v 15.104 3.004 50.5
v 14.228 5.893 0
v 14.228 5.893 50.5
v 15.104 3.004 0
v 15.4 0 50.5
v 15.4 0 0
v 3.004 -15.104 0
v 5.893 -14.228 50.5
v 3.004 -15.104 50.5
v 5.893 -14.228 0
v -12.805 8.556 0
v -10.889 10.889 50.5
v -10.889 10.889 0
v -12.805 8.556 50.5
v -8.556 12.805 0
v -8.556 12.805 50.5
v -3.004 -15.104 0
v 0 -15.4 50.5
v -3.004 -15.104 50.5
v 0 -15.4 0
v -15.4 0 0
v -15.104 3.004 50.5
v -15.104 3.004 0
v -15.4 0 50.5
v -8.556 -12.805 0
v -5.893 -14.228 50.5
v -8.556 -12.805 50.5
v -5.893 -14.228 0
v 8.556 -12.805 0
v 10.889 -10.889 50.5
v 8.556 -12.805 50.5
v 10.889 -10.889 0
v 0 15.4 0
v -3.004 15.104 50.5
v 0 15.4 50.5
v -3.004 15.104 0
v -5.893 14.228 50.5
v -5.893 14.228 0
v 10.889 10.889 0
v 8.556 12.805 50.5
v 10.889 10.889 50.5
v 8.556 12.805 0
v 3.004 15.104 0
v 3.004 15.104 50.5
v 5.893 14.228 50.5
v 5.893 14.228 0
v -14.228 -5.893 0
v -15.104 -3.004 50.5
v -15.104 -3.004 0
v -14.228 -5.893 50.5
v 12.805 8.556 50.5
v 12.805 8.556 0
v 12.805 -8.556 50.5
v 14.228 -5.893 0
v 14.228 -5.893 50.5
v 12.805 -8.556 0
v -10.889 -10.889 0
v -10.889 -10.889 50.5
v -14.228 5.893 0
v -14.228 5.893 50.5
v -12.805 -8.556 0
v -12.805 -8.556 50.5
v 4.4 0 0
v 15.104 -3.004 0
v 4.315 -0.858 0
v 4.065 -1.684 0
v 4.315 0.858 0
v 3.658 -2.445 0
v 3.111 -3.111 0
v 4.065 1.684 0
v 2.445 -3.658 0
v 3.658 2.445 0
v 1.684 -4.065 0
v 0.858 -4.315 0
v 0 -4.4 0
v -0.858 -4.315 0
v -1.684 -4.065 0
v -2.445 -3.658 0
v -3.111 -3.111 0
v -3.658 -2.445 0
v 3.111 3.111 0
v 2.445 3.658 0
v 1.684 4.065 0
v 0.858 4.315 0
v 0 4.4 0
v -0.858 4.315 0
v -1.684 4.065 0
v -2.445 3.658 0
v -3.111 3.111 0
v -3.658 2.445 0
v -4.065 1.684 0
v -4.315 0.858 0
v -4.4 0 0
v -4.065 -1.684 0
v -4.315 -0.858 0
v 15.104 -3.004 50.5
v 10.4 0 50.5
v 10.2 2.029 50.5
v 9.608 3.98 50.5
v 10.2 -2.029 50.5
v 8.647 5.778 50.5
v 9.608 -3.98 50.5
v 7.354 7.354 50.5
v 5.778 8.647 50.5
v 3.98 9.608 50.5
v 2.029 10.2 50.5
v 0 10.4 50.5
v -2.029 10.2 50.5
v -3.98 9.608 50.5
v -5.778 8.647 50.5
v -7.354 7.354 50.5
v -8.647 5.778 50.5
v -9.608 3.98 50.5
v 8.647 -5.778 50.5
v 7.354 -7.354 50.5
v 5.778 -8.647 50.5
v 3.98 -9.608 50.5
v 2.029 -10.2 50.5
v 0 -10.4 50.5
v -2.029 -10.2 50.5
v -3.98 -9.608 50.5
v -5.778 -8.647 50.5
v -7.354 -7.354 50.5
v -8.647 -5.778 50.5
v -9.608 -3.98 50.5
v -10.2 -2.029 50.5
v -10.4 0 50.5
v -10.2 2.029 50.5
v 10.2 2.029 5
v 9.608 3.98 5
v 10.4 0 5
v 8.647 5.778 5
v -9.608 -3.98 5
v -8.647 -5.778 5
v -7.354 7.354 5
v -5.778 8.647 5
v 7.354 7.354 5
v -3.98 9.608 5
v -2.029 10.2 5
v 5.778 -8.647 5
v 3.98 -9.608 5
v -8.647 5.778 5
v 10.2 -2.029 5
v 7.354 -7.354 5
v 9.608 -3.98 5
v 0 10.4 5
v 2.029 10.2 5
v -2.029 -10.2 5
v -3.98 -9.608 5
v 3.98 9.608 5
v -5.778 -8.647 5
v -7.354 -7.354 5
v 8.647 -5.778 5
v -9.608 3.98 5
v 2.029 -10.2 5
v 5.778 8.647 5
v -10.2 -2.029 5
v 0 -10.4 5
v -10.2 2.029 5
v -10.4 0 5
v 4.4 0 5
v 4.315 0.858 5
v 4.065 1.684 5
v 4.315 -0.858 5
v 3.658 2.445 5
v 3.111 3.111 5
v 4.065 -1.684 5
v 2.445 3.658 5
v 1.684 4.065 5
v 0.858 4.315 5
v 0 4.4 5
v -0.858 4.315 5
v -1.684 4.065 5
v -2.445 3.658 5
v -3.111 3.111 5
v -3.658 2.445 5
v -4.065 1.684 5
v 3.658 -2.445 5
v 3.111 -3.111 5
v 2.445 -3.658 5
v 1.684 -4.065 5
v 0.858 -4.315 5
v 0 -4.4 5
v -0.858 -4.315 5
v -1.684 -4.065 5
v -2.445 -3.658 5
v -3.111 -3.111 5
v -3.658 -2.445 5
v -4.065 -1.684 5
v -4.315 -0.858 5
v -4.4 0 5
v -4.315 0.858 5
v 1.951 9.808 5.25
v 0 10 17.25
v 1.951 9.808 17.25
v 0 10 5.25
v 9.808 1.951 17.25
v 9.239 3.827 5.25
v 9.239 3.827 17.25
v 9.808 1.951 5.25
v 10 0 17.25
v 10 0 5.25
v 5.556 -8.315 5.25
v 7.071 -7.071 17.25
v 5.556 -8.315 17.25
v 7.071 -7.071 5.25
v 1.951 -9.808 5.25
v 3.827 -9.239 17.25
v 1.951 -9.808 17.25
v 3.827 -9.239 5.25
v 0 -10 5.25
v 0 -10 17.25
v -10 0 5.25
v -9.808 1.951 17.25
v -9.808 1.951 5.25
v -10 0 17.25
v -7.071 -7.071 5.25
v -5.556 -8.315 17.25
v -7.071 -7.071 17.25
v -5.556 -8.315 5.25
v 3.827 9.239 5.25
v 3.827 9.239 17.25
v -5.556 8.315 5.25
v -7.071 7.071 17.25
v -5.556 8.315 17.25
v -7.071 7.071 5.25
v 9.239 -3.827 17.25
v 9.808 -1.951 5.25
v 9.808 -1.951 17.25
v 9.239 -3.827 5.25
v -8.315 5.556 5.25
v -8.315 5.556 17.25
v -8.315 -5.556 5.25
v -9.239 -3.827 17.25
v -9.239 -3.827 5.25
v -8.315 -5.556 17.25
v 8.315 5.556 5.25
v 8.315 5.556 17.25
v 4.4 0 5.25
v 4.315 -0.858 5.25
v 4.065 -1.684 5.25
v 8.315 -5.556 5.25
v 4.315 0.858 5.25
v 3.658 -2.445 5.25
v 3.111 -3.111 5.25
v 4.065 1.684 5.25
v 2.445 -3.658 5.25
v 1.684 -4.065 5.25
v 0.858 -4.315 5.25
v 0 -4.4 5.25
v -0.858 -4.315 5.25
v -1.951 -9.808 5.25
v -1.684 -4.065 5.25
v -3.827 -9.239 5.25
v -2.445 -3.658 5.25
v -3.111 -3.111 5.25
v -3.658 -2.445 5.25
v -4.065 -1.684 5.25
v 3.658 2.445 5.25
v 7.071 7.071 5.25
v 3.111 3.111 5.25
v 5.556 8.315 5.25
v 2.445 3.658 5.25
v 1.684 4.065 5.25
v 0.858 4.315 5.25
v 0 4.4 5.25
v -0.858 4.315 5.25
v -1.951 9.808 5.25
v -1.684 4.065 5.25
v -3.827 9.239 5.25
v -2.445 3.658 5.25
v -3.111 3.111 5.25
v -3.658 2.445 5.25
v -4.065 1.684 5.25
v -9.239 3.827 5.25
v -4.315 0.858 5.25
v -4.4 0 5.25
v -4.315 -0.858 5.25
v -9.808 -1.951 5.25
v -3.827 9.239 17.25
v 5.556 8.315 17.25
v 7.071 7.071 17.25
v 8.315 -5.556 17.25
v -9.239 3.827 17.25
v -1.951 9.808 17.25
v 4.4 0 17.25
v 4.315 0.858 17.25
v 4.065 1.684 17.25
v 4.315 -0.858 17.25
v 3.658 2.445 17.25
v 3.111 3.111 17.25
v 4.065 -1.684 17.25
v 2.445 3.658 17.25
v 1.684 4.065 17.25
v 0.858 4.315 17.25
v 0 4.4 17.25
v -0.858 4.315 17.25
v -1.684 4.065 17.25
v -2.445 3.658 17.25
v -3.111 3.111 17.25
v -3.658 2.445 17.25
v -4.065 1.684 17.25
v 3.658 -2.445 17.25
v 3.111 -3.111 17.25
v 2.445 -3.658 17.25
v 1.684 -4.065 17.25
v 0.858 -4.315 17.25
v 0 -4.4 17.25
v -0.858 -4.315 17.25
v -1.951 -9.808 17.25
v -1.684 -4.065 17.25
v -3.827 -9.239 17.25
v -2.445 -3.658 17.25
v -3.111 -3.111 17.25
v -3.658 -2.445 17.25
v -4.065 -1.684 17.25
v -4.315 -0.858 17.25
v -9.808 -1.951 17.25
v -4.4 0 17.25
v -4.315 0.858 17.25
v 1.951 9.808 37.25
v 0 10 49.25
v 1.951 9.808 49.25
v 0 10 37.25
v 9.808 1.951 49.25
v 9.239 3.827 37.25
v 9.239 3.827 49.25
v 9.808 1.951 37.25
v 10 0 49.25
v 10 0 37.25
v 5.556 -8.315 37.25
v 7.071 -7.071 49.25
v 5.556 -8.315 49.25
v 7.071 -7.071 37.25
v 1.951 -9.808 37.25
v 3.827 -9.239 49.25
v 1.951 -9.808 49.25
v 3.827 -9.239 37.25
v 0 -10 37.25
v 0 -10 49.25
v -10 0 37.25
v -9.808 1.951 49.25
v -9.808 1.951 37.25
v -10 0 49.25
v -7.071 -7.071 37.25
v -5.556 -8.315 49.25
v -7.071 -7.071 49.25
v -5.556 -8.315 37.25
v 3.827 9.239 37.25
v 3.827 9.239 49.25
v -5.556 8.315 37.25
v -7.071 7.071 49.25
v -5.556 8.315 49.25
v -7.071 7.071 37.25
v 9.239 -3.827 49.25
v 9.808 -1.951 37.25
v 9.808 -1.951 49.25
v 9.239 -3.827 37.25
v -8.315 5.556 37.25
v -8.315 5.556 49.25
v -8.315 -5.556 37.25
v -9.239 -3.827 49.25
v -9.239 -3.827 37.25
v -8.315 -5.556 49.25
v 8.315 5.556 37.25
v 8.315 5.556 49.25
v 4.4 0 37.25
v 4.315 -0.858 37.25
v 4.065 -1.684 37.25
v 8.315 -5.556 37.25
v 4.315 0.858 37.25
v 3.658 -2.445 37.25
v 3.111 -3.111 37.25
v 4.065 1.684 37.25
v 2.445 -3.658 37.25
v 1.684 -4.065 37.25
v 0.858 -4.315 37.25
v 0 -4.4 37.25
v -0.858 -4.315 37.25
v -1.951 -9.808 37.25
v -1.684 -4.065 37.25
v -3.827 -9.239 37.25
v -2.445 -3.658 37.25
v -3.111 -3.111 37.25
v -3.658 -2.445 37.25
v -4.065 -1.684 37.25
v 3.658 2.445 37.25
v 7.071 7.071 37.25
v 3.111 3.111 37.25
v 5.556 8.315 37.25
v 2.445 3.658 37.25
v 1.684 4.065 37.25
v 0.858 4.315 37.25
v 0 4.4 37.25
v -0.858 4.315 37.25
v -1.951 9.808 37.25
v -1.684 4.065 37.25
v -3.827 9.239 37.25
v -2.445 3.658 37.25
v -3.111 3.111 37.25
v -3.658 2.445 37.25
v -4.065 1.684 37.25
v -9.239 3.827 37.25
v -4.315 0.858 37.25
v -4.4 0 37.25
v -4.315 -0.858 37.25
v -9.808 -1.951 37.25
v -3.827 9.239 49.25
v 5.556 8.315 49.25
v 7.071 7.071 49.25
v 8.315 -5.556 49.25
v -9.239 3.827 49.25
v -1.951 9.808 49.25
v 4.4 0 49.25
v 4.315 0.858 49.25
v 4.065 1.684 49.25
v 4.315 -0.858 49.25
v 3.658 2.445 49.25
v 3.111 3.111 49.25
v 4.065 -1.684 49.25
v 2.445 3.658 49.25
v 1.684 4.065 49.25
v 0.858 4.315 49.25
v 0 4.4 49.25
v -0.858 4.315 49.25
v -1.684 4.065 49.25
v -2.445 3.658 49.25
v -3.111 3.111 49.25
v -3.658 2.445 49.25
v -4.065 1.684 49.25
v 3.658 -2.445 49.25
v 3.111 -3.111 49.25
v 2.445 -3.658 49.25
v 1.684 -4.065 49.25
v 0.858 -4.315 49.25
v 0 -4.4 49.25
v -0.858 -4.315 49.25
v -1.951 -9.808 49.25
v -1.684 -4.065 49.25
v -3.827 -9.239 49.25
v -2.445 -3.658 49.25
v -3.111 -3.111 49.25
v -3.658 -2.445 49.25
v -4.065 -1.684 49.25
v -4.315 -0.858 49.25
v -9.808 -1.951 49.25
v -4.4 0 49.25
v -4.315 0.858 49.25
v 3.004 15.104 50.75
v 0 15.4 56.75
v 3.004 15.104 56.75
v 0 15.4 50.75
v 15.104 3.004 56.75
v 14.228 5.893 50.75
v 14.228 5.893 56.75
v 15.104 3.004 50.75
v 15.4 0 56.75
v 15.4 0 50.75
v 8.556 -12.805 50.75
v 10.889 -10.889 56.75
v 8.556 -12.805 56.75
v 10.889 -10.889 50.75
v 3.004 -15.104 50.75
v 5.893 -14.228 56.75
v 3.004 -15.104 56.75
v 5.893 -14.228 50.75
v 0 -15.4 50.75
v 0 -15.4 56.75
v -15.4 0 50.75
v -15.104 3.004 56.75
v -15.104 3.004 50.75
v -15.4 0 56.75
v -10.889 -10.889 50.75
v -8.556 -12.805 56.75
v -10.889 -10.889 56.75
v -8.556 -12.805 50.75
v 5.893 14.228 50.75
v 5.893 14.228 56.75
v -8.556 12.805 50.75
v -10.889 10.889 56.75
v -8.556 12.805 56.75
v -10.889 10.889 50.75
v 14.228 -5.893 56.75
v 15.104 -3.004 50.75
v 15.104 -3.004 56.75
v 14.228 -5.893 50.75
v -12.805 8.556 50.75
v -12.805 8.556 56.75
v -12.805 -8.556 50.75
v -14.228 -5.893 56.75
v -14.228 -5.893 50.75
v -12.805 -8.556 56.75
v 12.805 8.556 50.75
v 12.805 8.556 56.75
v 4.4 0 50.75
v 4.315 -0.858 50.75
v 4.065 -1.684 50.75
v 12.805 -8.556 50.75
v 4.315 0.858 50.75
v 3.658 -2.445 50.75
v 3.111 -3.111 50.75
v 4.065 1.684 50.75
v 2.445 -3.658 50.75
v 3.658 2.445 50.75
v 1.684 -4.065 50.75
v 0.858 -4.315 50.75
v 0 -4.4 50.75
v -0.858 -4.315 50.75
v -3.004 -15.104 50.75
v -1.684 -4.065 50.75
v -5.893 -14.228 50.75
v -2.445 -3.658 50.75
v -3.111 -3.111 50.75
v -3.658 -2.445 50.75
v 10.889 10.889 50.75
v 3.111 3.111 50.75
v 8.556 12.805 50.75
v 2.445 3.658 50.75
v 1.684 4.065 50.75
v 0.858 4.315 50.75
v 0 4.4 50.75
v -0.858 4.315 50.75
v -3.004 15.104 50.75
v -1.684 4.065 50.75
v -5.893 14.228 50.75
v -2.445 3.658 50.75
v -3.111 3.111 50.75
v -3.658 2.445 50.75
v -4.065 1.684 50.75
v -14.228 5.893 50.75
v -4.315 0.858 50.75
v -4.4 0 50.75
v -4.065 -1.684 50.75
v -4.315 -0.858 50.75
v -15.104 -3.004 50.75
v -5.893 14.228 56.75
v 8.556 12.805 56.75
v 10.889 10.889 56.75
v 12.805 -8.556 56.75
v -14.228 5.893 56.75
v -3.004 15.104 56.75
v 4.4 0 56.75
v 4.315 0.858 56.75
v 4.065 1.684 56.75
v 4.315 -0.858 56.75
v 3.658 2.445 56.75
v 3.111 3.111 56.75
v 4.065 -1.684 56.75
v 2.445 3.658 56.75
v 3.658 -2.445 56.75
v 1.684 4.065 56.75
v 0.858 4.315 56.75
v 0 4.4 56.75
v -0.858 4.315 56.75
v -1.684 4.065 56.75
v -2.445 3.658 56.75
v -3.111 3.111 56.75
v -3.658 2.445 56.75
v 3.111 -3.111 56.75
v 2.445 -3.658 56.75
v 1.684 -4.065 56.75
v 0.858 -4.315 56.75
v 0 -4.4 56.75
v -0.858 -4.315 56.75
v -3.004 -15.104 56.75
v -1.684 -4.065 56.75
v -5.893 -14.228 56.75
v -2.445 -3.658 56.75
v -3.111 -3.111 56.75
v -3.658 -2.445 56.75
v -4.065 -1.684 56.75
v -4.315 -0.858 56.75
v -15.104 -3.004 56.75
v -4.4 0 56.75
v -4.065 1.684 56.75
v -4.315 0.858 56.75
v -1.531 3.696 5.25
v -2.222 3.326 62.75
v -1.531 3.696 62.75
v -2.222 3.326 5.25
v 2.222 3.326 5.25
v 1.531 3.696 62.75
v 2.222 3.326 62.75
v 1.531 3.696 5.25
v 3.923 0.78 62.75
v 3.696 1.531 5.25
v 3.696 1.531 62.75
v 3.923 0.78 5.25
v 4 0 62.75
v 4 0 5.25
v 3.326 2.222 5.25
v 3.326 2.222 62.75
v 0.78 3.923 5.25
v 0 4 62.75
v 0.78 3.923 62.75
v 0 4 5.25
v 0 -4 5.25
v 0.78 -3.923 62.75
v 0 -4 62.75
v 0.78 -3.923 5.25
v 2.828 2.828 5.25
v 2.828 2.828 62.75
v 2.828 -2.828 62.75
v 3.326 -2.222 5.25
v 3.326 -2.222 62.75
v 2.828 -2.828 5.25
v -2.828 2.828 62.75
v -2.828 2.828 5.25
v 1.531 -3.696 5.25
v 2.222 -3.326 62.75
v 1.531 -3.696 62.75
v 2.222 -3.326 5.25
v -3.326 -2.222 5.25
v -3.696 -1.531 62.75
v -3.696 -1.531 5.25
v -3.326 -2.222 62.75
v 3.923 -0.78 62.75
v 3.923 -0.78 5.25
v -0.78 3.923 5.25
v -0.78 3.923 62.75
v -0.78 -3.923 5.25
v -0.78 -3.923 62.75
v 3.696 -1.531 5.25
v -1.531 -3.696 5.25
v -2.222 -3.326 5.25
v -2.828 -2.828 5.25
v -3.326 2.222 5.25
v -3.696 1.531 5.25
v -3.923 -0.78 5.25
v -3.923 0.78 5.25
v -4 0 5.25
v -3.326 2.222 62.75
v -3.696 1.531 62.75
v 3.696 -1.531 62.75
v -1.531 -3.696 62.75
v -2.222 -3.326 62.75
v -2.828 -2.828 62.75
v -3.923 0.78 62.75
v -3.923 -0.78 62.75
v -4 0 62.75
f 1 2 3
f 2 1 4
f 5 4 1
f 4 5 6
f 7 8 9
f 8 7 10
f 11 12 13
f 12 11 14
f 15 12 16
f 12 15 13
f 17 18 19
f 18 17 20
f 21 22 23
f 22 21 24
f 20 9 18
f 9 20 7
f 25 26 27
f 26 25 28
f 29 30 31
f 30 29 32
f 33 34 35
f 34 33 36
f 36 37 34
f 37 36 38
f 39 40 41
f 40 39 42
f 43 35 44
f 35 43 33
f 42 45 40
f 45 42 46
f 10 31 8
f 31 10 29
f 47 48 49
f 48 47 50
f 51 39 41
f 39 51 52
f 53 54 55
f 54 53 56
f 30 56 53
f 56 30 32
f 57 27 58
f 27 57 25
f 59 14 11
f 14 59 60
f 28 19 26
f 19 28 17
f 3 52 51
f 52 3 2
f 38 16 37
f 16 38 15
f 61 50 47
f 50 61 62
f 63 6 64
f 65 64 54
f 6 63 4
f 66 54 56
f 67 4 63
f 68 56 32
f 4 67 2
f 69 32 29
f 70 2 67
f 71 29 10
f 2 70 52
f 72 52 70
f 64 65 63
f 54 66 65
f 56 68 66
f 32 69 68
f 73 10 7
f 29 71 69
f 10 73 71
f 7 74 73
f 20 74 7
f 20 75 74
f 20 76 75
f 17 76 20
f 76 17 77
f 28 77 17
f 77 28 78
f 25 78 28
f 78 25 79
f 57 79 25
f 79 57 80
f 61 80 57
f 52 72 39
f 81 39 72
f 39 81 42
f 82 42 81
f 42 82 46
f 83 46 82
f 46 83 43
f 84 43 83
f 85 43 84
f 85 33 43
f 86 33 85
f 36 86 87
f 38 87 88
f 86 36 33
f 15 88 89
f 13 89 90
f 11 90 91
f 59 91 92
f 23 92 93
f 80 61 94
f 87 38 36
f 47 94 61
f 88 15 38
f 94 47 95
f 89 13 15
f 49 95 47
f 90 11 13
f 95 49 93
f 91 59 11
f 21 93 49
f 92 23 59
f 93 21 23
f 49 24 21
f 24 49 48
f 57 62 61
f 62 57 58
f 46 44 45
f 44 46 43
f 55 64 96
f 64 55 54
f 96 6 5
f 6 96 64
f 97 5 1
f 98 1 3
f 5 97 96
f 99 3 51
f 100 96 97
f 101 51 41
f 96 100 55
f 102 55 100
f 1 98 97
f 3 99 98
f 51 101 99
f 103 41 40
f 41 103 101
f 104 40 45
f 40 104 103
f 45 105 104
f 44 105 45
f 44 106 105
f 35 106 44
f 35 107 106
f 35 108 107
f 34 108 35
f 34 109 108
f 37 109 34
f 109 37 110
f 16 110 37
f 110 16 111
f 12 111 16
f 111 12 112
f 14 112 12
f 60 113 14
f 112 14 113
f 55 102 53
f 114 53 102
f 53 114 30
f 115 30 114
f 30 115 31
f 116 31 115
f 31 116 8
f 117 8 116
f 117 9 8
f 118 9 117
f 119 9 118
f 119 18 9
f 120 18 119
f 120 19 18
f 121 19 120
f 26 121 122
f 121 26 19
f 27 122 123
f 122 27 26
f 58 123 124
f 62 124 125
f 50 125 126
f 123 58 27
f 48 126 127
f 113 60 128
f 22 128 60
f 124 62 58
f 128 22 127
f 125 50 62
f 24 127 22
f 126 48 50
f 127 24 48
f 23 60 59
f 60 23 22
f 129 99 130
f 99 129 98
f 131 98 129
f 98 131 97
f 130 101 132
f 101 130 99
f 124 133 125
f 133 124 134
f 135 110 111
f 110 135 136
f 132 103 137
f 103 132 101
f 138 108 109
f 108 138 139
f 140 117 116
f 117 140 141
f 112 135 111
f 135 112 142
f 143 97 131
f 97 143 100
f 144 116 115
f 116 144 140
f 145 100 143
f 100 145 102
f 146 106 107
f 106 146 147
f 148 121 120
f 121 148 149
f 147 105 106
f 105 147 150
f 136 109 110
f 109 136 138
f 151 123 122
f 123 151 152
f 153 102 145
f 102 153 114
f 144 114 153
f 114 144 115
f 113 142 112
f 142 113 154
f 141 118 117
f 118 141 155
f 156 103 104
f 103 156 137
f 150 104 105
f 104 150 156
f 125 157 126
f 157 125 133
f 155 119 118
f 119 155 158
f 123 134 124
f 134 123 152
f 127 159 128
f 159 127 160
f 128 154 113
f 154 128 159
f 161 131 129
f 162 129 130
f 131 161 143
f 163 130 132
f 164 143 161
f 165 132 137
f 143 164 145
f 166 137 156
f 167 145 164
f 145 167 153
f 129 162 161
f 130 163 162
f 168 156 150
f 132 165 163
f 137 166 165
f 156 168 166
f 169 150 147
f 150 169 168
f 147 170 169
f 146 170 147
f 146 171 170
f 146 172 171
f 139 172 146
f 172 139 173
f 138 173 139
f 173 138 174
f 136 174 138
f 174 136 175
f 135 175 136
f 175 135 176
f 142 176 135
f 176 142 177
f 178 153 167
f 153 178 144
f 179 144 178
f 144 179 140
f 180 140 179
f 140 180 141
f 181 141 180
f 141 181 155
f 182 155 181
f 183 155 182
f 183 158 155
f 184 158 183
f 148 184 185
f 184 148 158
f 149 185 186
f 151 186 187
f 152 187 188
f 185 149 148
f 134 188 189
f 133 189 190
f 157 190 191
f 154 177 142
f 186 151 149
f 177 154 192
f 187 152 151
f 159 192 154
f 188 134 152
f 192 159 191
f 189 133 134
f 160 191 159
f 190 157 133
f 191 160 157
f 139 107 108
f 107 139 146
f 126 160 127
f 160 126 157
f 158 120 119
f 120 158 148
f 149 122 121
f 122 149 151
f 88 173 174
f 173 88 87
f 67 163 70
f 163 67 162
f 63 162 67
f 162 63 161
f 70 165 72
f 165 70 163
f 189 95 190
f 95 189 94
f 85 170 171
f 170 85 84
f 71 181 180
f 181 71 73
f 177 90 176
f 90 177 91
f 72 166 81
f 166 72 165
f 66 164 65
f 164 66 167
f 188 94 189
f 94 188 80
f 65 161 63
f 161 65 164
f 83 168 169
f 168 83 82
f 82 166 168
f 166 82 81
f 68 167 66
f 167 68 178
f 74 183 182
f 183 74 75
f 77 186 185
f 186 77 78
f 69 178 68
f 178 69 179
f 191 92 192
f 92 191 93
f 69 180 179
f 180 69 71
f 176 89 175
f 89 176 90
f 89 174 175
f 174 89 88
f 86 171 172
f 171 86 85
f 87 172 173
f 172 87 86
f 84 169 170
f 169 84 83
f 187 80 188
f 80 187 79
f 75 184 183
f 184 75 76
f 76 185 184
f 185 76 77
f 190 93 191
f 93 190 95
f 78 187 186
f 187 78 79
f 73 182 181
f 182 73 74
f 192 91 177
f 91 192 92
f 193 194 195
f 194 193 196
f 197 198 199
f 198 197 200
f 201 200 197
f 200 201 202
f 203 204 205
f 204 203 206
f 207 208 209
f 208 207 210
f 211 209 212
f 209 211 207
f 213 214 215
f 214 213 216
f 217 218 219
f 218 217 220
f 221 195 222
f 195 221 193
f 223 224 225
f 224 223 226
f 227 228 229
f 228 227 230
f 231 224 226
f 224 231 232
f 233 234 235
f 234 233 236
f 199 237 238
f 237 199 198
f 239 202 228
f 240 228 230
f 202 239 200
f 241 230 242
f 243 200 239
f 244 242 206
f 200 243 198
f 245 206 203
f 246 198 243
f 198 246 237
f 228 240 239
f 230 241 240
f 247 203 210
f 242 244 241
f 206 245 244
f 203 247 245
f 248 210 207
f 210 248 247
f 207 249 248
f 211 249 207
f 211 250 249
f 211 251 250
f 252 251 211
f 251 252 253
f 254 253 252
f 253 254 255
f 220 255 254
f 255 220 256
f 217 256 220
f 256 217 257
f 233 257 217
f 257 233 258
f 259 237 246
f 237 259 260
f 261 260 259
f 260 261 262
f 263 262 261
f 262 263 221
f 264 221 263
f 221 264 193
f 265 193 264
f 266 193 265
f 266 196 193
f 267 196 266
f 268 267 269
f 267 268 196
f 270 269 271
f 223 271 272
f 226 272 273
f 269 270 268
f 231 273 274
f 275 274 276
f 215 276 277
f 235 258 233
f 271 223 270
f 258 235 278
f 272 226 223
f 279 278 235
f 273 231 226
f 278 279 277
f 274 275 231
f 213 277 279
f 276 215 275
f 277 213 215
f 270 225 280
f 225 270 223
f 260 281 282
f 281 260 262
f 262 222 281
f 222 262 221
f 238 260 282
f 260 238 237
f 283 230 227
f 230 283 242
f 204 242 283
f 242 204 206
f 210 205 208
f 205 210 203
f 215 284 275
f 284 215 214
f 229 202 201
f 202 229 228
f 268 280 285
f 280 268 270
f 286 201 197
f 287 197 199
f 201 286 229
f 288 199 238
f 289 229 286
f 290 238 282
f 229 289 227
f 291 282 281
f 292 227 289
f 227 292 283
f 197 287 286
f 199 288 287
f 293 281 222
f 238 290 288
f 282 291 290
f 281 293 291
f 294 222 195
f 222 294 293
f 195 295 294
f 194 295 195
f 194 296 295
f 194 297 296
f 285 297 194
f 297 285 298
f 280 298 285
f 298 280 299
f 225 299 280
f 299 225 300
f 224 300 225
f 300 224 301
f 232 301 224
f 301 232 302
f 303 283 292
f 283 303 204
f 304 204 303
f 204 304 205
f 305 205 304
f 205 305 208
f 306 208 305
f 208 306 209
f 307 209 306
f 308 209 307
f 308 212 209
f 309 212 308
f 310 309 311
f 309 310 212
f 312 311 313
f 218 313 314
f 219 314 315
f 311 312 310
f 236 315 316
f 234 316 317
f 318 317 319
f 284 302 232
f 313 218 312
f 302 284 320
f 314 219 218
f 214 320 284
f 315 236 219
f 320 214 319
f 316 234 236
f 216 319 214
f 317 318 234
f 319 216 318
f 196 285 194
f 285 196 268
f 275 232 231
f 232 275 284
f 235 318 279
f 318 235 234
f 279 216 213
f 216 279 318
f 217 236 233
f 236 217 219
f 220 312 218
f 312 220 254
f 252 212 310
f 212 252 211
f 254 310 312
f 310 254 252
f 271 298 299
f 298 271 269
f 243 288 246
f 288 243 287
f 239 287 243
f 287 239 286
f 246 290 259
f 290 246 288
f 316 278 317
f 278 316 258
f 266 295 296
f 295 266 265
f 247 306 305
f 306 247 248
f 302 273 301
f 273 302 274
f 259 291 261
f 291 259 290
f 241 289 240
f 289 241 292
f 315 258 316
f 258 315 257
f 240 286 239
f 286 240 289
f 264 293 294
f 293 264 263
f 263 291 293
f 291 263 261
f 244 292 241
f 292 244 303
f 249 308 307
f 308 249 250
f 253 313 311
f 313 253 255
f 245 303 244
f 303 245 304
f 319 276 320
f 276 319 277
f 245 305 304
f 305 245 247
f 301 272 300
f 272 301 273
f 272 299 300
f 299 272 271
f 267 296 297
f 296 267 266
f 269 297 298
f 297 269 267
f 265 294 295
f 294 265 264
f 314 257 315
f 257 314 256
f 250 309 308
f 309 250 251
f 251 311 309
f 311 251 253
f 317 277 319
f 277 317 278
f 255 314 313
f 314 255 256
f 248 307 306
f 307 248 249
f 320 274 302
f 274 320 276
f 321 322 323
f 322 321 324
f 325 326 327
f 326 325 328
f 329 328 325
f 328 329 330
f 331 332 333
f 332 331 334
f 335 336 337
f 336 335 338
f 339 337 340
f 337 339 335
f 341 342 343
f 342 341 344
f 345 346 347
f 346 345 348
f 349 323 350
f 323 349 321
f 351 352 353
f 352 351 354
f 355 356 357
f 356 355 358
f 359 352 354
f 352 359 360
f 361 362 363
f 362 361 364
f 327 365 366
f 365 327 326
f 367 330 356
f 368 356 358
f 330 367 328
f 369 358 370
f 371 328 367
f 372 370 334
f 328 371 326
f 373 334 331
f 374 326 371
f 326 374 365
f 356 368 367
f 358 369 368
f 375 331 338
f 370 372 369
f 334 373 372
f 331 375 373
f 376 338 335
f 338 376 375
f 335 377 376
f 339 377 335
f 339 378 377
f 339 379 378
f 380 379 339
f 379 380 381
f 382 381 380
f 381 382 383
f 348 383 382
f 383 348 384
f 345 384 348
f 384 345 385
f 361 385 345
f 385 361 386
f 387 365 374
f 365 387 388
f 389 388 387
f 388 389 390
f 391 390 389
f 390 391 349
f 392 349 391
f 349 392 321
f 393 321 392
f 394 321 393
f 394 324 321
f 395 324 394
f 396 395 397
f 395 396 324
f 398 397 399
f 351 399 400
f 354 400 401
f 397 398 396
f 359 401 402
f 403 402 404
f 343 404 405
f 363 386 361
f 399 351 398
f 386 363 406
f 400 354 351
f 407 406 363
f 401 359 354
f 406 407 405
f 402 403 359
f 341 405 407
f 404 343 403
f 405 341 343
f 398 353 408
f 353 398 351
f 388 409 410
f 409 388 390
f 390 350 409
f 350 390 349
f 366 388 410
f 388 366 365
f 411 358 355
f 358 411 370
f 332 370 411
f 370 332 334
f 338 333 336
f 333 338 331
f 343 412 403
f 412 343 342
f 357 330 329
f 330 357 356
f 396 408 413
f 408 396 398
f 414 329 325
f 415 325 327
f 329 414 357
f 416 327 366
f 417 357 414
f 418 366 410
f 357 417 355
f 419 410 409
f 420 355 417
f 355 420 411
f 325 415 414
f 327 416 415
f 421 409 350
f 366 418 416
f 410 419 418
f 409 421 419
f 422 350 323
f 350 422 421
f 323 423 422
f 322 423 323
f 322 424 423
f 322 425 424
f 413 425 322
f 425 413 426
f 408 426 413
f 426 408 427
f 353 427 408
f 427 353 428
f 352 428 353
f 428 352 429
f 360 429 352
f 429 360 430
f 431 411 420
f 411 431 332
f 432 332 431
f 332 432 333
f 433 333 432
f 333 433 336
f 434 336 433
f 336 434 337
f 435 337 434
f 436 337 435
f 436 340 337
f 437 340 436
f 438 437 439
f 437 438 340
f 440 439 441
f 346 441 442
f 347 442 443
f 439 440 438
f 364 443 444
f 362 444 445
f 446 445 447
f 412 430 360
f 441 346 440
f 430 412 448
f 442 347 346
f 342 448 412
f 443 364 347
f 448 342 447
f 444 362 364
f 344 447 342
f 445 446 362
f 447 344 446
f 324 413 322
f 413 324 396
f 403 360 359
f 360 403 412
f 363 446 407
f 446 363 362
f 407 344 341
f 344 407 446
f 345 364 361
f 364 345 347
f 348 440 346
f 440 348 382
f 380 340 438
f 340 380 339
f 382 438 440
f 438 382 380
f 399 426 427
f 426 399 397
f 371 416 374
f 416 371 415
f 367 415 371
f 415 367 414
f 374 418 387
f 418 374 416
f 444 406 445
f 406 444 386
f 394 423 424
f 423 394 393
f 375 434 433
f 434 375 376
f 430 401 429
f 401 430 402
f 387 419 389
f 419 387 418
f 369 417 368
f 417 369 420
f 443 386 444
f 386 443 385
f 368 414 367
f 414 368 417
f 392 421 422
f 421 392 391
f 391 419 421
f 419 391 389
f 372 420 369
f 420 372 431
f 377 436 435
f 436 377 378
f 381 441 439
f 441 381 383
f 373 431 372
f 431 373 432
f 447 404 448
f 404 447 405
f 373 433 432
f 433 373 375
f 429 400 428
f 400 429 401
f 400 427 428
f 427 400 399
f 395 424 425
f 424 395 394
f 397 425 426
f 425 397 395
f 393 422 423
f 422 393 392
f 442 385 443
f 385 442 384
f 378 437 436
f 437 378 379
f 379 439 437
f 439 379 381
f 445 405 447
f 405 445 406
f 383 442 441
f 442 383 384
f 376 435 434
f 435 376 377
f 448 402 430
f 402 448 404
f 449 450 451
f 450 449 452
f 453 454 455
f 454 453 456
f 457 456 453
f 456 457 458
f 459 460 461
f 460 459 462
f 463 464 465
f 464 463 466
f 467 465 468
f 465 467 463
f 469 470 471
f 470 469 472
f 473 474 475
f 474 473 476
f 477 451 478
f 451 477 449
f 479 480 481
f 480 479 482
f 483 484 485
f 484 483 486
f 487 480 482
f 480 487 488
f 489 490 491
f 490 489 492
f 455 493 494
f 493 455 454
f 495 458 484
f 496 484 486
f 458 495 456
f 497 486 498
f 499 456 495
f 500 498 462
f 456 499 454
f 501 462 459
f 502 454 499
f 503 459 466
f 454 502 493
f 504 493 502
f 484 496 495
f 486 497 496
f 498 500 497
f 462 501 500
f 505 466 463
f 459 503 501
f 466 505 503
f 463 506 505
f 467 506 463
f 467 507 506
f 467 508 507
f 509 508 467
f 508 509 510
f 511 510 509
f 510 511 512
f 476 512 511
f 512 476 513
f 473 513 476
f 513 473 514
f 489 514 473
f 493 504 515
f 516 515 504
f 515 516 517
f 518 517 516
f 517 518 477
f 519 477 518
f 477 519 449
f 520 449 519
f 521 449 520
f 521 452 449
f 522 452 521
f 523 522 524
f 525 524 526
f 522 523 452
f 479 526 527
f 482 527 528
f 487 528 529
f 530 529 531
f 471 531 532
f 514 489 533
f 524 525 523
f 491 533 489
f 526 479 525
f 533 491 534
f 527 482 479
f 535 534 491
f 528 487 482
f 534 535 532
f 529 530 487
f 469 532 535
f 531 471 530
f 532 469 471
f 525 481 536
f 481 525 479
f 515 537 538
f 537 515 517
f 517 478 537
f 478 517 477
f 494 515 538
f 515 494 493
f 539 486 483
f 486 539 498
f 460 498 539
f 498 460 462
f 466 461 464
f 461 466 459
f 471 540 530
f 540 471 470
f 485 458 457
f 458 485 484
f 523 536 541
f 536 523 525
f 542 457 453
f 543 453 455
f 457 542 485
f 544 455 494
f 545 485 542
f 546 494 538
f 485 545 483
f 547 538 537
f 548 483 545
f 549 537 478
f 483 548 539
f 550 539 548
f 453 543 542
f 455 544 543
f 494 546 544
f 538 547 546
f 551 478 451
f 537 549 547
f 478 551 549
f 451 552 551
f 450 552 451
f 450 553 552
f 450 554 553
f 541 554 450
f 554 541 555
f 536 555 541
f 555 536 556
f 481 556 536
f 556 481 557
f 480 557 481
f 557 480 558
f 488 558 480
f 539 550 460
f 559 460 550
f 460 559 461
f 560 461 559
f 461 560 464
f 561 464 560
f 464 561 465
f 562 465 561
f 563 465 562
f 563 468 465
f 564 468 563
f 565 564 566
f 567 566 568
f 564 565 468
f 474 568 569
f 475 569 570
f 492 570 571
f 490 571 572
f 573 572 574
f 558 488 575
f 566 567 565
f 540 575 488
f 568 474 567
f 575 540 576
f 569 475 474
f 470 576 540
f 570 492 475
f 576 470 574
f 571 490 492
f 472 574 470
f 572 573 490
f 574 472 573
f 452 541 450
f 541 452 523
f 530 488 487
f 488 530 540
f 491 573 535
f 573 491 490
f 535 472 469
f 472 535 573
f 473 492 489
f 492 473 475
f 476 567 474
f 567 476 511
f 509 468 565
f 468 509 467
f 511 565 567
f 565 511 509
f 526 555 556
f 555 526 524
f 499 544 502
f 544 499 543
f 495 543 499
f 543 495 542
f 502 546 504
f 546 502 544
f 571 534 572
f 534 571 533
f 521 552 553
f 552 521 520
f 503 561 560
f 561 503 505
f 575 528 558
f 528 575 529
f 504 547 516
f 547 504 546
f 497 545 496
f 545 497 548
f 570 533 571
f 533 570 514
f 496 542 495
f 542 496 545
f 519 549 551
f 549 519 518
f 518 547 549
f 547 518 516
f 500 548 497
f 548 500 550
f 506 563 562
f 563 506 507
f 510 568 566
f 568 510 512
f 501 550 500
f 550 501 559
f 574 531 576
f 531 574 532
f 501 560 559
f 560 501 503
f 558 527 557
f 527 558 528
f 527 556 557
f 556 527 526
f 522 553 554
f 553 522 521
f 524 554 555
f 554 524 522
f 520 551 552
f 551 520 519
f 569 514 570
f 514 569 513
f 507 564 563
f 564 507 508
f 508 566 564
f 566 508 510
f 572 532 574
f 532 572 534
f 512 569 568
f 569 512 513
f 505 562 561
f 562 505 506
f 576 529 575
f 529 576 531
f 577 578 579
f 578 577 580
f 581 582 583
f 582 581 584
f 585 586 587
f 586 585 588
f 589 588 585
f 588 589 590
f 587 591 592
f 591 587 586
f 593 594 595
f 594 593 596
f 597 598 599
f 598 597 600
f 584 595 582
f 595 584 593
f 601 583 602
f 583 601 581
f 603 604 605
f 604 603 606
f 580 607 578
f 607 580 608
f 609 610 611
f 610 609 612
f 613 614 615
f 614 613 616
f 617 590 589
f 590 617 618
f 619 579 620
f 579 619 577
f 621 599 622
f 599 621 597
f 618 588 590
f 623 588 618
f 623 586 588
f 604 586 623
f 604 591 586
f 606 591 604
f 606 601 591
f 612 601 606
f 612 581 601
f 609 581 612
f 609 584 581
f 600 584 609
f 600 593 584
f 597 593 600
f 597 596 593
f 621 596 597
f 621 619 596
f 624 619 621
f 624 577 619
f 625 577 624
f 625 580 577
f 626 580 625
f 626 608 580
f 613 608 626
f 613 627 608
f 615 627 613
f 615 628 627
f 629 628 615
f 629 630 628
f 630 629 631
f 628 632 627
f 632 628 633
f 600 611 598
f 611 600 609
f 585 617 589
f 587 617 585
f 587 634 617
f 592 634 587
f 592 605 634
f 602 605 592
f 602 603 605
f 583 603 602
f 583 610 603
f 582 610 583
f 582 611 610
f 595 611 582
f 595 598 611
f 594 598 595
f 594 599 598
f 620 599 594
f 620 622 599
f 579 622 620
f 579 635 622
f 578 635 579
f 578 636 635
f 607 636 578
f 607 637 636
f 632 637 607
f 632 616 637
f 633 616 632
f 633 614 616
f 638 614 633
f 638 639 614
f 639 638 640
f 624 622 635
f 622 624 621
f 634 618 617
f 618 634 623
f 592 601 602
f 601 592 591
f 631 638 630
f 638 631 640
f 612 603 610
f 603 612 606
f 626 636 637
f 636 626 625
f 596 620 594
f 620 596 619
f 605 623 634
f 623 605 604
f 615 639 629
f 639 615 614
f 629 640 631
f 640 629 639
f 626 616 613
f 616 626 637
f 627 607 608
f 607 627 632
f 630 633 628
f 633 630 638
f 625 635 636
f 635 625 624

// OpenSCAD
$fn = 32;

// ------------------------------------------------------------------------
// Shaft station: cup d30.8 x 50.5 mm, shaft d8
// Every part is its own module, assembly() places every instance.
// ------------------------------------------------------------------------

// --- part 1 ---
module housing_cup() {
  difference() {
    cylinder(h = 50.5, d = 30.8);
    translate([0, 0, 5]) cylinder(h = 46.5, d = 20.8);
    translate([0, 0, -1]) cylinder(h = 7, d = 8.8);
  }
}

// --- part 2 ---
module bearing_lower() {
  difference() {
      translate([0, 0, 0]) cylinder(h = 12, d = 20);
      translate([0, 0, -1]) cylinder(h = 14, d = 8.8);
    }
}

// --- part 3 ---
module bearing_upper() {
  difference() {
      translate([0, 0, 0]) cylinder(h = 12, d = 20);
      translate([0, 0, -1]) cylinder(h = 14, d = 8.8);
    }
}

// --- part 4 ---
module station_shaft() {
  translate([0, 0, -28.75]) cylinder(h = 57.5, d = 8);
}

// --- part 5 ---
module station_cover() {
  difference() {
    cylinder(h = 6, d = 30.8);
    translate([0, 0, -1]) cylinder(h = 8, d = 8.8);
  }
}

// --- assembly ---
module assembly() {
  color([0.80, 0.24, 0.20]) translate([0, 0, 0]) rotate([0, 0, 0]) housing_cup();
  color([0.20, 0.45, 0.75]) translate([0, 0, 5.25]) rotate([0, 0, 0]) bearing_lower();
  color([0.25, 0.62, 0.32]) translate([0, 0, 37.25]) rotate([0, 0, 0]) bearing_upper();
  color([0.92, 0.70, 0.18]) translate([0, 0, 34]) rotate([0, 0, 0]) station_shaft();
  color([0.58, 0.35, 0.70]) translate([0, 0, 50.75]) rotate([0, 0, 0]) station_cover();
}

assembly();
